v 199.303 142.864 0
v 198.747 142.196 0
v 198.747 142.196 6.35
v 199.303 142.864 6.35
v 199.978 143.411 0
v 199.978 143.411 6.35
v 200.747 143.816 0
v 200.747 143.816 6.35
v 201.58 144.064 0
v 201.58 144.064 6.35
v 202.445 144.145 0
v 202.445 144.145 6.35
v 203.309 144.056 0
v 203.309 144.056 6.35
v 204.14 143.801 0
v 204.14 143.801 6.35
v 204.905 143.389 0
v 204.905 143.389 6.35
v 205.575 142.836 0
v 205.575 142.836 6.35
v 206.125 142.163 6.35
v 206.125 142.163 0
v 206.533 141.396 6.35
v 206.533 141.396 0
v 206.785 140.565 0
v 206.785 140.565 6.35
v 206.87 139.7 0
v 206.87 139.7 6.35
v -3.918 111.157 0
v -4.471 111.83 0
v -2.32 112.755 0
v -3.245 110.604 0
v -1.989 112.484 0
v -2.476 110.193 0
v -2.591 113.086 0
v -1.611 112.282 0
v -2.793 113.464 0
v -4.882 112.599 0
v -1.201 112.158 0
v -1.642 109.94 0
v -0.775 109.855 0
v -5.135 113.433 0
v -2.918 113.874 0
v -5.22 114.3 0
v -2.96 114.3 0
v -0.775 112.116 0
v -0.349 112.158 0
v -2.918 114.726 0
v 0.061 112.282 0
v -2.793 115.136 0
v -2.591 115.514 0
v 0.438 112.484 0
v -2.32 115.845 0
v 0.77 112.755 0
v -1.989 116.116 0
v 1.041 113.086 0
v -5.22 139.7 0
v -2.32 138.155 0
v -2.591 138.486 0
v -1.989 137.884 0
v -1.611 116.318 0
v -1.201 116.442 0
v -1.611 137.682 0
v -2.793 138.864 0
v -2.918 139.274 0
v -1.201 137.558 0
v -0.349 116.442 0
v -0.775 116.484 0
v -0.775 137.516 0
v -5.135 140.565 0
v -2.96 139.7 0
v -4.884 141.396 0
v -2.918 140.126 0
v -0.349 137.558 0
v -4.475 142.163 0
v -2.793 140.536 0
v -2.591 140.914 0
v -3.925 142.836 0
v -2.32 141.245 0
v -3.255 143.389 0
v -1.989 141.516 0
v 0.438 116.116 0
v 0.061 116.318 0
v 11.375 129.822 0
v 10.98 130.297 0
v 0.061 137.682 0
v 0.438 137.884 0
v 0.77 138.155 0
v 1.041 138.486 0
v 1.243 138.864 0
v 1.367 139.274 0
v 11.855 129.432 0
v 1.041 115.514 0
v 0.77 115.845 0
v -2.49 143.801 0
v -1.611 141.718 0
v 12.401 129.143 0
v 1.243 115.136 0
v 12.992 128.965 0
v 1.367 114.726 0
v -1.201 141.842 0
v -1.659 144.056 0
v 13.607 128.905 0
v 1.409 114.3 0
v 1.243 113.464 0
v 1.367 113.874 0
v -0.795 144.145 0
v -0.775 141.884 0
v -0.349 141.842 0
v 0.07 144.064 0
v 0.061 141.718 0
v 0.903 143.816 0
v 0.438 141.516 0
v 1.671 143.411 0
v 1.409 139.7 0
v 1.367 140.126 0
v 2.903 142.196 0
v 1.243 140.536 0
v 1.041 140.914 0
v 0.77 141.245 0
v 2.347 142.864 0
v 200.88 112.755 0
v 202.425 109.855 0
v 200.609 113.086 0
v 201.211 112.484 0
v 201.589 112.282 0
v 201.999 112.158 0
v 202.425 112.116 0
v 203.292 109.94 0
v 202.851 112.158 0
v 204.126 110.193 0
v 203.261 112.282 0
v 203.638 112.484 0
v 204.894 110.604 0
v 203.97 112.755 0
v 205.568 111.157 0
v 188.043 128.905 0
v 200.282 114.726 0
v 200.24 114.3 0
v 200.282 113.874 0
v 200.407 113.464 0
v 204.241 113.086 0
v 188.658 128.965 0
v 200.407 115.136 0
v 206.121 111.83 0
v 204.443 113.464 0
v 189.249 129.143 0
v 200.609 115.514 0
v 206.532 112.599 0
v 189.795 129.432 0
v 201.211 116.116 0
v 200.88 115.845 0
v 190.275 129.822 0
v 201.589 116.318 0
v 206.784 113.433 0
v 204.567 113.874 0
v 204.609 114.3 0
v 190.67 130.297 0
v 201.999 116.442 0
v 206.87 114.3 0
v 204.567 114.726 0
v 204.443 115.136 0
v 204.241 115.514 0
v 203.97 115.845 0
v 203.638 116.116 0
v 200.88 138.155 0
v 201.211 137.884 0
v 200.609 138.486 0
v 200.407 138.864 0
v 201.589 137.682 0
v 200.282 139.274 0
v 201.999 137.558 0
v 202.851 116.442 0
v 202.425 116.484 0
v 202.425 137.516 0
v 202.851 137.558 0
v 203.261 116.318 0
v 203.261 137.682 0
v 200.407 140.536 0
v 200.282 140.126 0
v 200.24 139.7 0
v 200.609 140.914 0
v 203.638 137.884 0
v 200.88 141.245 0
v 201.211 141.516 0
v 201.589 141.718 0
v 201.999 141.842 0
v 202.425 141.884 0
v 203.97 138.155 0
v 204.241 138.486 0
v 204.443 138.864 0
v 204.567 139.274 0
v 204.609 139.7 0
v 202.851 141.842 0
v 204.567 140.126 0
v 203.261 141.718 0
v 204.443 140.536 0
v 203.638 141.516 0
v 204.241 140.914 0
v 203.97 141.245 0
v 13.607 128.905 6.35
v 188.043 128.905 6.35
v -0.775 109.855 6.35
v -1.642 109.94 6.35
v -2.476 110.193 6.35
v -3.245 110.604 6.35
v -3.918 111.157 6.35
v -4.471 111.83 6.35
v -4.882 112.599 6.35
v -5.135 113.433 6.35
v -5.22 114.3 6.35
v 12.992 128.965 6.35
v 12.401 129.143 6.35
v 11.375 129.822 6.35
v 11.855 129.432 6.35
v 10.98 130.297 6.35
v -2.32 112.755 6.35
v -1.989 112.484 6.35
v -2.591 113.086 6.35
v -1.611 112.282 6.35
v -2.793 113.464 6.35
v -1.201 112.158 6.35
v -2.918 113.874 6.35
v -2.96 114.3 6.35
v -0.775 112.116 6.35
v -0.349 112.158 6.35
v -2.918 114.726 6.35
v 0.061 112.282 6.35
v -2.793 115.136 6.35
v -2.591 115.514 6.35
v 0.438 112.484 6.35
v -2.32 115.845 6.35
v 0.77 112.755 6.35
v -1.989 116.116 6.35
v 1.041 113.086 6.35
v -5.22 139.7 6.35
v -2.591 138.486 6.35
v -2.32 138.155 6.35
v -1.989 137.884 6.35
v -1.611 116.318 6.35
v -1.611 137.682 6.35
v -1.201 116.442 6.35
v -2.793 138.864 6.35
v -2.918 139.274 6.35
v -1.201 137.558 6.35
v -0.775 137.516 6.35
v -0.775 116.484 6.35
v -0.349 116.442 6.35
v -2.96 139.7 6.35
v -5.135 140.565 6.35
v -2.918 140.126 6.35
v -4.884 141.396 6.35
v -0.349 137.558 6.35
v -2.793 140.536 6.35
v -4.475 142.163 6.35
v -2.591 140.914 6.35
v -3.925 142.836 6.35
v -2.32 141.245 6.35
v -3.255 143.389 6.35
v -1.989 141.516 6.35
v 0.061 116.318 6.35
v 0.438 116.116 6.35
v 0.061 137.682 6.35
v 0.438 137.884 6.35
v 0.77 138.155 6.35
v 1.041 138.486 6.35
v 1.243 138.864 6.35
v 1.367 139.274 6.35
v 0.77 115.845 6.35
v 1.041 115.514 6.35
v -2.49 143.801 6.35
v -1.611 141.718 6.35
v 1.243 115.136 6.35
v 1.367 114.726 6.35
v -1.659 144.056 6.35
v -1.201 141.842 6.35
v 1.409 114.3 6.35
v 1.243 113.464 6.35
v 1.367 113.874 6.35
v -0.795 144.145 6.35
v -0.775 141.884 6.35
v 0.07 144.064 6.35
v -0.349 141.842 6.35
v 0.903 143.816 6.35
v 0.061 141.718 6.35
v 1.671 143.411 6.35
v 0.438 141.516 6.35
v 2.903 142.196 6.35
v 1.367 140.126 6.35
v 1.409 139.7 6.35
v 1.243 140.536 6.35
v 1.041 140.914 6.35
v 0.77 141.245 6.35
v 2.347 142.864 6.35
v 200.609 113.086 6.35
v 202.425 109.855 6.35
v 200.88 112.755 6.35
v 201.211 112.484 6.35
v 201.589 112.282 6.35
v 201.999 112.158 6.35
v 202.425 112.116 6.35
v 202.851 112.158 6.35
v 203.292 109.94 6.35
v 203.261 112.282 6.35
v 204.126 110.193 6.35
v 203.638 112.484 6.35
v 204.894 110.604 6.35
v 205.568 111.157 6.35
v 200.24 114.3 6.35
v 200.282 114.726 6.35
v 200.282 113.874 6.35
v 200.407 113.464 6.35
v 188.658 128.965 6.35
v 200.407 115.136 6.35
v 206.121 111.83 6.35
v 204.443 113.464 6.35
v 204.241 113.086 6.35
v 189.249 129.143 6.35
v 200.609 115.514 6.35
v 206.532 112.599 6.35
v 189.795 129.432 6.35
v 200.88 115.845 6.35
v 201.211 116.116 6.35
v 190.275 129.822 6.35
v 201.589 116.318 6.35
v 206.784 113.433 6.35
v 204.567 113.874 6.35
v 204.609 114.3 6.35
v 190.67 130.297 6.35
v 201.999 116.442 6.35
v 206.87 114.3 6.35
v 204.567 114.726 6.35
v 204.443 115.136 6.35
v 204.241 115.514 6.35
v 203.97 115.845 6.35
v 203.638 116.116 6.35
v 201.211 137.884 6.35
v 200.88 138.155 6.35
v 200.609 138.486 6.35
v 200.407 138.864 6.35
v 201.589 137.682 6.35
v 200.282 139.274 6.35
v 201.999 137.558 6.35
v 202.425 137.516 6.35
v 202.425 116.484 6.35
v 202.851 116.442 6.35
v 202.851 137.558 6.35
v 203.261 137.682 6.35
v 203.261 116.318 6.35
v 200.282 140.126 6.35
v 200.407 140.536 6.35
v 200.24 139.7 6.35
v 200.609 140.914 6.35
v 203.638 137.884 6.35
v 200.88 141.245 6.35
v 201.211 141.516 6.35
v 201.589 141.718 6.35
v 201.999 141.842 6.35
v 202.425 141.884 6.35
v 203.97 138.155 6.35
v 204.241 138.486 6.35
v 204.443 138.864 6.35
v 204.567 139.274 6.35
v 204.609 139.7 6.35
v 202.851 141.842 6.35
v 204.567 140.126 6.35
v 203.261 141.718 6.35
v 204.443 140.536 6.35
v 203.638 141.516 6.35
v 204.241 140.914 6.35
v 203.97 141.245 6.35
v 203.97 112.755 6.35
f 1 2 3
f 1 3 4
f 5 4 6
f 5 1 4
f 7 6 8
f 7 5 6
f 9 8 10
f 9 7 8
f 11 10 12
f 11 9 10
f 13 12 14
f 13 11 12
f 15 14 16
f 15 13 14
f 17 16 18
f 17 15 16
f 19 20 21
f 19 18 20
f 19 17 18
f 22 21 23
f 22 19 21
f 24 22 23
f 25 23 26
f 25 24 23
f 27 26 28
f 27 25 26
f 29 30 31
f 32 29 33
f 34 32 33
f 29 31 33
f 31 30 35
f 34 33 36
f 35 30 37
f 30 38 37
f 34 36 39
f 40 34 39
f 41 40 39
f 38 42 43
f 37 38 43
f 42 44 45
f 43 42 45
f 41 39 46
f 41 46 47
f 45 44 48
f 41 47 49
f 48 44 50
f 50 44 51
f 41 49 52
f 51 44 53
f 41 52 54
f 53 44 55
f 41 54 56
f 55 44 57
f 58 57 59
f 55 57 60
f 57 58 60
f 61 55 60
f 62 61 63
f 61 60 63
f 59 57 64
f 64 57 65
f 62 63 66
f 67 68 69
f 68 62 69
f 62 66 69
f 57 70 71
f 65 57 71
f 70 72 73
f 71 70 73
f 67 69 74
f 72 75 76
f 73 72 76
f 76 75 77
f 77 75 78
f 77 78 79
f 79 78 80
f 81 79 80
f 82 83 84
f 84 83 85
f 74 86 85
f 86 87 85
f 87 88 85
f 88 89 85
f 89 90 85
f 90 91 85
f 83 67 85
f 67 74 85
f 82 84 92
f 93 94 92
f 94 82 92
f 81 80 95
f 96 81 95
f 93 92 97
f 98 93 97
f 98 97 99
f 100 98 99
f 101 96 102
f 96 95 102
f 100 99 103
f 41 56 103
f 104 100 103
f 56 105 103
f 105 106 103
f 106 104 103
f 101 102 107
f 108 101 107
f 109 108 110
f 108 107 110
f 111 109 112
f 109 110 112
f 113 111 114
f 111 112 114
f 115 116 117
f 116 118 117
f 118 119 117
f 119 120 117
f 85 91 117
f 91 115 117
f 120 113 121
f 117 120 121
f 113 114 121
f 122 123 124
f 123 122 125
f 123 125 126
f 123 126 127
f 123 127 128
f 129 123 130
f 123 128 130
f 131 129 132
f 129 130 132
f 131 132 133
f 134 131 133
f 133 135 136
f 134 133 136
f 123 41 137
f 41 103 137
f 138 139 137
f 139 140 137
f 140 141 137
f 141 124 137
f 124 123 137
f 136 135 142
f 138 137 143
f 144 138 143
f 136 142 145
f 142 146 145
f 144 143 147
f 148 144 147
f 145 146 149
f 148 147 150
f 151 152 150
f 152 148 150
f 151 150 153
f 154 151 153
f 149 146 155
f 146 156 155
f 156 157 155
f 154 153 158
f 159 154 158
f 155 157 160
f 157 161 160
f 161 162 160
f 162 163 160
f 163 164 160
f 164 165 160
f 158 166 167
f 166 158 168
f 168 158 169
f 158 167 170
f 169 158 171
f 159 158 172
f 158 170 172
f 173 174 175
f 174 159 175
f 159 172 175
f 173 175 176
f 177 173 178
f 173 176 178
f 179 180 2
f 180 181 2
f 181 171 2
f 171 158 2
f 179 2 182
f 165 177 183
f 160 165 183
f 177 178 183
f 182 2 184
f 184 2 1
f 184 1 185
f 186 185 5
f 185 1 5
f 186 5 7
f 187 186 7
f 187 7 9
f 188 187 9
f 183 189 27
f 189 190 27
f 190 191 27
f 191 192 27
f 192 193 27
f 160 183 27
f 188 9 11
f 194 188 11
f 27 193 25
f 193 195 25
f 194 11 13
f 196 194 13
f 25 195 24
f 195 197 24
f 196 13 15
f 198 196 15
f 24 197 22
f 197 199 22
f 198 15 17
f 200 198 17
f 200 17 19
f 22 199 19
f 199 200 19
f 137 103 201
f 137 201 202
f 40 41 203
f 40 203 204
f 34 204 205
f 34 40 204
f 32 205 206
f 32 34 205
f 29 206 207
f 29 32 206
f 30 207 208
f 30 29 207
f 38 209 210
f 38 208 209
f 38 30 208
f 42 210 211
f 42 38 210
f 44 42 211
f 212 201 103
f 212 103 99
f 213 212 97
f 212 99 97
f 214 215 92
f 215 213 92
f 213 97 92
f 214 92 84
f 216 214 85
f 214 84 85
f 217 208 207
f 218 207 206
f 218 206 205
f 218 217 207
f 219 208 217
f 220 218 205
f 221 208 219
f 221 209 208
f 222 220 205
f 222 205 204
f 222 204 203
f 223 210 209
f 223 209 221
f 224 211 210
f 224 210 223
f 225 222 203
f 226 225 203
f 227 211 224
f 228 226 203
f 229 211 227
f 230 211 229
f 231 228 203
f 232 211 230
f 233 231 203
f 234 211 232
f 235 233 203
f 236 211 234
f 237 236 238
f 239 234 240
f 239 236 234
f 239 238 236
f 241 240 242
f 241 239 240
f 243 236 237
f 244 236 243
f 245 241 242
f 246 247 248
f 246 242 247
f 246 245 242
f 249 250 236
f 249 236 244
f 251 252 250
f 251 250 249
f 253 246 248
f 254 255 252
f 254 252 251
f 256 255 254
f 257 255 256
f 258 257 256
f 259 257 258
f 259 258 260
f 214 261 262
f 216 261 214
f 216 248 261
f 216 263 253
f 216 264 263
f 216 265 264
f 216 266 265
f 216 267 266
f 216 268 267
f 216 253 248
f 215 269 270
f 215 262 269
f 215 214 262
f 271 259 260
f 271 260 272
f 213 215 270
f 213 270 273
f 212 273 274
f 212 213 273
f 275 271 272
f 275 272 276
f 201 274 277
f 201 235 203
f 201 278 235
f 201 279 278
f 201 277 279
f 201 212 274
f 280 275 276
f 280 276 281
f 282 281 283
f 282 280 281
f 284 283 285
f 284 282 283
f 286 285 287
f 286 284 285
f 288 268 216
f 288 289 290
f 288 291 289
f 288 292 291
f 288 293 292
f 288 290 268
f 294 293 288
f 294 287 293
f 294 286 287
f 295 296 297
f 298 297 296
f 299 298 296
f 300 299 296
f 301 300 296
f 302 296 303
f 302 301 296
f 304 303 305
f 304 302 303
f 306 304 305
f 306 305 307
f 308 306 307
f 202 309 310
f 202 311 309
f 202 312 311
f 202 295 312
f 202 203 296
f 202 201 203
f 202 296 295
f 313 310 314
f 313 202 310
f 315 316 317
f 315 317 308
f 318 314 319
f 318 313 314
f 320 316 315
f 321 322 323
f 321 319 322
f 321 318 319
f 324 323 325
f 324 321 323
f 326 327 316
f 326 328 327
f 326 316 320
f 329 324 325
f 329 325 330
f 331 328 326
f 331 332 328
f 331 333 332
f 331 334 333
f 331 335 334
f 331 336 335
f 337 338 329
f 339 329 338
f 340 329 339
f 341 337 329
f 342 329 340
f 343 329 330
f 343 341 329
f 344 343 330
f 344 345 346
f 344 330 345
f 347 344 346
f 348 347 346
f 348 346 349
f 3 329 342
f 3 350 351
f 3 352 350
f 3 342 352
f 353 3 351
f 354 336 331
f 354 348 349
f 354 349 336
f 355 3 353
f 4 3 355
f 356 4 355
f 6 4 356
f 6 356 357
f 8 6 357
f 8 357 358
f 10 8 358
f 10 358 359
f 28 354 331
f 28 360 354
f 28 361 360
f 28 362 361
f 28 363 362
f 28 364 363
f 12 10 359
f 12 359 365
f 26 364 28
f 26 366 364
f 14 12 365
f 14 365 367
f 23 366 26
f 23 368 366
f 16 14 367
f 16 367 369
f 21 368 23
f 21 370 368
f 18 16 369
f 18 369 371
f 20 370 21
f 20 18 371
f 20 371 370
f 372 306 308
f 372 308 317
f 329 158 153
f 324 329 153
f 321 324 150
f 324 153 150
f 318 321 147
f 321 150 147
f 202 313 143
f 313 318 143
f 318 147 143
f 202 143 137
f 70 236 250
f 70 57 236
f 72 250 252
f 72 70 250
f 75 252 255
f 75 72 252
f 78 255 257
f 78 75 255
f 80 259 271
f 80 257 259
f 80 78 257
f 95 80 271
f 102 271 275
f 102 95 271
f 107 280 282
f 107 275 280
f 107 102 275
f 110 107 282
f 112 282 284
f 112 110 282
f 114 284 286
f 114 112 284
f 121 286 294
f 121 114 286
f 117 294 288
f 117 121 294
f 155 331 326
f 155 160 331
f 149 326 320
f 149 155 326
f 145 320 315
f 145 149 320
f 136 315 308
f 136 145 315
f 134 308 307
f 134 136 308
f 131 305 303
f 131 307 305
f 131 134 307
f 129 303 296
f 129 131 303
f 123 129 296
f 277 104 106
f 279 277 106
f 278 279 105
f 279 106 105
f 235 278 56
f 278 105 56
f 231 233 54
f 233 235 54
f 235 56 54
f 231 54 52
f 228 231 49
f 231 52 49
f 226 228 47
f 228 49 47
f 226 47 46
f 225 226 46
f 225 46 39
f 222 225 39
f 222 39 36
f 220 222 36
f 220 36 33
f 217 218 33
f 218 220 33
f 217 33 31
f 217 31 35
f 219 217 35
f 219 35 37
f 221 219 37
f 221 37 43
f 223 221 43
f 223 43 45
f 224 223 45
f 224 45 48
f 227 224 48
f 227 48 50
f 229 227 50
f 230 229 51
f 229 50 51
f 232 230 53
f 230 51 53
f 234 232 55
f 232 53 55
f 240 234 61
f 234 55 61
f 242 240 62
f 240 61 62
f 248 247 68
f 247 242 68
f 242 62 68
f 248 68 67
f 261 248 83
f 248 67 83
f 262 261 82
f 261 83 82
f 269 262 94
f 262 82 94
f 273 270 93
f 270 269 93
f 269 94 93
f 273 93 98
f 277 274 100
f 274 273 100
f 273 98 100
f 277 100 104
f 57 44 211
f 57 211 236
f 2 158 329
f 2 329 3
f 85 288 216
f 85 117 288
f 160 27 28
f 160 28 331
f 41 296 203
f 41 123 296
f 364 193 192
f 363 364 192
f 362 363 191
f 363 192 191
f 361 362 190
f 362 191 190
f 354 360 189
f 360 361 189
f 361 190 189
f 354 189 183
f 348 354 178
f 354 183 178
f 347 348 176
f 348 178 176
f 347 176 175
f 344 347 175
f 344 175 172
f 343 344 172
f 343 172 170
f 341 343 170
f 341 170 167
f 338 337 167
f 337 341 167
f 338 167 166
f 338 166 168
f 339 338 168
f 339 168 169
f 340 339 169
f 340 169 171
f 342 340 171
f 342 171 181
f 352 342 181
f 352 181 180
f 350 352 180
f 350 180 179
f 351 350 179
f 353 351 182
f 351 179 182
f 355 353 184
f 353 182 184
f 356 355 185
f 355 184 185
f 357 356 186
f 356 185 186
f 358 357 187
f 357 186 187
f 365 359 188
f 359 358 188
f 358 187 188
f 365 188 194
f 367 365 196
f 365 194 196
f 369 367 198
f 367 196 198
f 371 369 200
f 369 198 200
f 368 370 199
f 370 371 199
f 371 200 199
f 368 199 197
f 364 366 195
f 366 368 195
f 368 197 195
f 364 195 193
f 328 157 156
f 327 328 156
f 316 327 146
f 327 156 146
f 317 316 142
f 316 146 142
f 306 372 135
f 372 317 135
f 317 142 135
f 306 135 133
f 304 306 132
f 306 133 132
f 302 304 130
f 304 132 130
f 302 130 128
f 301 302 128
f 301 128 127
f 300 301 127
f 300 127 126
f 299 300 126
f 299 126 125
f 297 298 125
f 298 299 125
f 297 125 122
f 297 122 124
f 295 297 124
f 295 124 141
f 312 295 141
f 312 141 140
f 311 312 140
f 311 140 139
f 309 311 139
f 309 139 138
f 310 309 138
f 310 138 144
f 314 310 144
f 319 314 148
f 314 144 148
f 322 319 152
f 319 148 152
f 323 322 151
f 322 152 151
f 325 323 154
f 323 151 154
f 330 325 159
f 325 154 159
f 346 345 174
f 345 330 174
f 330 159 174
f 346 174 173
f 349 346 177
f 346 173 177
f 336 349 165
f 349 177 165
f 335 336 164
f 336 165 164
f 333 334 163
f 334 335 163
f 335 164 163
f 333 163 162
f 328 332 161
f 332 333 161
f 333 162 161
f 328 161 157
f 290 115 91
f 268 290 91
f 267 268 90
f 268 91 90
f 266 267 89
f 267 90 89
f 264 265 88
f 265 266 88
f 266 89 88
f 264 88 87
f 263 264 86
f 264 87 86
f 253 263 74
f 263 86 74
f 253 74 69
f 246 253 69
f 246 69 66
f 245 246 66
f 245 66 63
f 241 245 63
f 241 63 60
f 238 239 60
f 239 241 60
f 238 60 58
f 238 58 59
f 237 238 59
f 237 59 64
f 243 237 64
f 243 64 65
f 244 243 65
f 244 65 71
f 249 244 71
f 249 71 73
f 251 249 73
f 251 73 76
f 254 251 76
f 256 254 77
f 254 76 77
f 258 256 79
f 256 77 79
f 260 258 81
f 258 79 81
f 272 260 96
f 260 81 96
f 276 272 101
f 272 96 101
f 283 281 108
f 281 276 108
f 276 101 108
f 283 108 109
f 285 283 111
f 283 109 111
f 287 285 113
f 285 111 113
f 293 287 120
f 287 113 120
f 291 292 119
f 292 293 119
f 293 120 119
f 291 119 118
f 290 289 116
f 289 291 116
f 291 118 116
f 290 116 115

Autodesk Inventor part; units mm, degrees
ref_plane "YZ Plane" through (0, 0, 0) normal (1, 0, 0) x (0, 1, 0)
ref_plane "XZ Plane" through (0, 0, 0) normal (0, 1, 0) x (-1, 0, 0)
ref_plane "XY Plane" through (0, 0, 0) normal (0, 0, 1) x (1, 0, 0)
sketch "Sketch1" plane through (0, 0, 0) normal (0, 0, 1) x (1, 0, 0)
  circle A0 centre (-0.7751, 114.3) radius 2.1844 projected
  circle A1 centre (-0.7751, 139.7) radius 2.1844 projected
  circle A2 centre (202.4249, 139.7) radius 2.1844 projected
  circle A3 centre (202.4249, 114.3) radius 2.1844 projected
  arc A4 (-5.2201, 114.3) -> (-0.7751, 109.855) centre (-0.7751, 114.3) ccw
  circle A5 centre (-0.7751, 139.7) radius 4.445
  arc A6 (206.8699, 139.7) -> (198.7471, 142.1965) centre (202.4249, 139.7) ccw
  arc A7 (202.4249, 109.855) -> (206.8699, 114.3) centre (202.4249, 114.3) ccw
  line L0 (202.4249, 109.855) -> (-0.7751, 109.855)
  line L1 (-5.2201, 114.3) -> (-5.2201, 139.7)
  line L2 (2.9026, 142.1965) -> (10.9801, 130.2968)
  line L3 (13.607, 128.905) -> (188.0427, 128.905)
  line L4 (190.6696, 130.2968) -> (198.7471, 142.1965)
  line L5 (206.8699, 140.9911) -> (206.8699, 114.3)
  arc A8 (188.0427, 128.905) -> (190.6696, 130.2968) centre (188.0427, 132.08) ccw
  arc A9 (10.9801, 130.2968) -> (13.607, 128.905) centre (13.607, 132.08) ccw
  point P0 (0, 0)
  point P1 (11.9249, 128.905)
  point P2 (189.7249, 128.905)
  dimension "d0" = 8.89
  dimension "d2" = 19.05
  dimension "d3" = 177.8
  dimension "d4" = 3.175
extrude "Extrusion1" add sketch "Sketch1" along normal blind 6.35
properties part number "brace" material "Acetal Resin, Black"
